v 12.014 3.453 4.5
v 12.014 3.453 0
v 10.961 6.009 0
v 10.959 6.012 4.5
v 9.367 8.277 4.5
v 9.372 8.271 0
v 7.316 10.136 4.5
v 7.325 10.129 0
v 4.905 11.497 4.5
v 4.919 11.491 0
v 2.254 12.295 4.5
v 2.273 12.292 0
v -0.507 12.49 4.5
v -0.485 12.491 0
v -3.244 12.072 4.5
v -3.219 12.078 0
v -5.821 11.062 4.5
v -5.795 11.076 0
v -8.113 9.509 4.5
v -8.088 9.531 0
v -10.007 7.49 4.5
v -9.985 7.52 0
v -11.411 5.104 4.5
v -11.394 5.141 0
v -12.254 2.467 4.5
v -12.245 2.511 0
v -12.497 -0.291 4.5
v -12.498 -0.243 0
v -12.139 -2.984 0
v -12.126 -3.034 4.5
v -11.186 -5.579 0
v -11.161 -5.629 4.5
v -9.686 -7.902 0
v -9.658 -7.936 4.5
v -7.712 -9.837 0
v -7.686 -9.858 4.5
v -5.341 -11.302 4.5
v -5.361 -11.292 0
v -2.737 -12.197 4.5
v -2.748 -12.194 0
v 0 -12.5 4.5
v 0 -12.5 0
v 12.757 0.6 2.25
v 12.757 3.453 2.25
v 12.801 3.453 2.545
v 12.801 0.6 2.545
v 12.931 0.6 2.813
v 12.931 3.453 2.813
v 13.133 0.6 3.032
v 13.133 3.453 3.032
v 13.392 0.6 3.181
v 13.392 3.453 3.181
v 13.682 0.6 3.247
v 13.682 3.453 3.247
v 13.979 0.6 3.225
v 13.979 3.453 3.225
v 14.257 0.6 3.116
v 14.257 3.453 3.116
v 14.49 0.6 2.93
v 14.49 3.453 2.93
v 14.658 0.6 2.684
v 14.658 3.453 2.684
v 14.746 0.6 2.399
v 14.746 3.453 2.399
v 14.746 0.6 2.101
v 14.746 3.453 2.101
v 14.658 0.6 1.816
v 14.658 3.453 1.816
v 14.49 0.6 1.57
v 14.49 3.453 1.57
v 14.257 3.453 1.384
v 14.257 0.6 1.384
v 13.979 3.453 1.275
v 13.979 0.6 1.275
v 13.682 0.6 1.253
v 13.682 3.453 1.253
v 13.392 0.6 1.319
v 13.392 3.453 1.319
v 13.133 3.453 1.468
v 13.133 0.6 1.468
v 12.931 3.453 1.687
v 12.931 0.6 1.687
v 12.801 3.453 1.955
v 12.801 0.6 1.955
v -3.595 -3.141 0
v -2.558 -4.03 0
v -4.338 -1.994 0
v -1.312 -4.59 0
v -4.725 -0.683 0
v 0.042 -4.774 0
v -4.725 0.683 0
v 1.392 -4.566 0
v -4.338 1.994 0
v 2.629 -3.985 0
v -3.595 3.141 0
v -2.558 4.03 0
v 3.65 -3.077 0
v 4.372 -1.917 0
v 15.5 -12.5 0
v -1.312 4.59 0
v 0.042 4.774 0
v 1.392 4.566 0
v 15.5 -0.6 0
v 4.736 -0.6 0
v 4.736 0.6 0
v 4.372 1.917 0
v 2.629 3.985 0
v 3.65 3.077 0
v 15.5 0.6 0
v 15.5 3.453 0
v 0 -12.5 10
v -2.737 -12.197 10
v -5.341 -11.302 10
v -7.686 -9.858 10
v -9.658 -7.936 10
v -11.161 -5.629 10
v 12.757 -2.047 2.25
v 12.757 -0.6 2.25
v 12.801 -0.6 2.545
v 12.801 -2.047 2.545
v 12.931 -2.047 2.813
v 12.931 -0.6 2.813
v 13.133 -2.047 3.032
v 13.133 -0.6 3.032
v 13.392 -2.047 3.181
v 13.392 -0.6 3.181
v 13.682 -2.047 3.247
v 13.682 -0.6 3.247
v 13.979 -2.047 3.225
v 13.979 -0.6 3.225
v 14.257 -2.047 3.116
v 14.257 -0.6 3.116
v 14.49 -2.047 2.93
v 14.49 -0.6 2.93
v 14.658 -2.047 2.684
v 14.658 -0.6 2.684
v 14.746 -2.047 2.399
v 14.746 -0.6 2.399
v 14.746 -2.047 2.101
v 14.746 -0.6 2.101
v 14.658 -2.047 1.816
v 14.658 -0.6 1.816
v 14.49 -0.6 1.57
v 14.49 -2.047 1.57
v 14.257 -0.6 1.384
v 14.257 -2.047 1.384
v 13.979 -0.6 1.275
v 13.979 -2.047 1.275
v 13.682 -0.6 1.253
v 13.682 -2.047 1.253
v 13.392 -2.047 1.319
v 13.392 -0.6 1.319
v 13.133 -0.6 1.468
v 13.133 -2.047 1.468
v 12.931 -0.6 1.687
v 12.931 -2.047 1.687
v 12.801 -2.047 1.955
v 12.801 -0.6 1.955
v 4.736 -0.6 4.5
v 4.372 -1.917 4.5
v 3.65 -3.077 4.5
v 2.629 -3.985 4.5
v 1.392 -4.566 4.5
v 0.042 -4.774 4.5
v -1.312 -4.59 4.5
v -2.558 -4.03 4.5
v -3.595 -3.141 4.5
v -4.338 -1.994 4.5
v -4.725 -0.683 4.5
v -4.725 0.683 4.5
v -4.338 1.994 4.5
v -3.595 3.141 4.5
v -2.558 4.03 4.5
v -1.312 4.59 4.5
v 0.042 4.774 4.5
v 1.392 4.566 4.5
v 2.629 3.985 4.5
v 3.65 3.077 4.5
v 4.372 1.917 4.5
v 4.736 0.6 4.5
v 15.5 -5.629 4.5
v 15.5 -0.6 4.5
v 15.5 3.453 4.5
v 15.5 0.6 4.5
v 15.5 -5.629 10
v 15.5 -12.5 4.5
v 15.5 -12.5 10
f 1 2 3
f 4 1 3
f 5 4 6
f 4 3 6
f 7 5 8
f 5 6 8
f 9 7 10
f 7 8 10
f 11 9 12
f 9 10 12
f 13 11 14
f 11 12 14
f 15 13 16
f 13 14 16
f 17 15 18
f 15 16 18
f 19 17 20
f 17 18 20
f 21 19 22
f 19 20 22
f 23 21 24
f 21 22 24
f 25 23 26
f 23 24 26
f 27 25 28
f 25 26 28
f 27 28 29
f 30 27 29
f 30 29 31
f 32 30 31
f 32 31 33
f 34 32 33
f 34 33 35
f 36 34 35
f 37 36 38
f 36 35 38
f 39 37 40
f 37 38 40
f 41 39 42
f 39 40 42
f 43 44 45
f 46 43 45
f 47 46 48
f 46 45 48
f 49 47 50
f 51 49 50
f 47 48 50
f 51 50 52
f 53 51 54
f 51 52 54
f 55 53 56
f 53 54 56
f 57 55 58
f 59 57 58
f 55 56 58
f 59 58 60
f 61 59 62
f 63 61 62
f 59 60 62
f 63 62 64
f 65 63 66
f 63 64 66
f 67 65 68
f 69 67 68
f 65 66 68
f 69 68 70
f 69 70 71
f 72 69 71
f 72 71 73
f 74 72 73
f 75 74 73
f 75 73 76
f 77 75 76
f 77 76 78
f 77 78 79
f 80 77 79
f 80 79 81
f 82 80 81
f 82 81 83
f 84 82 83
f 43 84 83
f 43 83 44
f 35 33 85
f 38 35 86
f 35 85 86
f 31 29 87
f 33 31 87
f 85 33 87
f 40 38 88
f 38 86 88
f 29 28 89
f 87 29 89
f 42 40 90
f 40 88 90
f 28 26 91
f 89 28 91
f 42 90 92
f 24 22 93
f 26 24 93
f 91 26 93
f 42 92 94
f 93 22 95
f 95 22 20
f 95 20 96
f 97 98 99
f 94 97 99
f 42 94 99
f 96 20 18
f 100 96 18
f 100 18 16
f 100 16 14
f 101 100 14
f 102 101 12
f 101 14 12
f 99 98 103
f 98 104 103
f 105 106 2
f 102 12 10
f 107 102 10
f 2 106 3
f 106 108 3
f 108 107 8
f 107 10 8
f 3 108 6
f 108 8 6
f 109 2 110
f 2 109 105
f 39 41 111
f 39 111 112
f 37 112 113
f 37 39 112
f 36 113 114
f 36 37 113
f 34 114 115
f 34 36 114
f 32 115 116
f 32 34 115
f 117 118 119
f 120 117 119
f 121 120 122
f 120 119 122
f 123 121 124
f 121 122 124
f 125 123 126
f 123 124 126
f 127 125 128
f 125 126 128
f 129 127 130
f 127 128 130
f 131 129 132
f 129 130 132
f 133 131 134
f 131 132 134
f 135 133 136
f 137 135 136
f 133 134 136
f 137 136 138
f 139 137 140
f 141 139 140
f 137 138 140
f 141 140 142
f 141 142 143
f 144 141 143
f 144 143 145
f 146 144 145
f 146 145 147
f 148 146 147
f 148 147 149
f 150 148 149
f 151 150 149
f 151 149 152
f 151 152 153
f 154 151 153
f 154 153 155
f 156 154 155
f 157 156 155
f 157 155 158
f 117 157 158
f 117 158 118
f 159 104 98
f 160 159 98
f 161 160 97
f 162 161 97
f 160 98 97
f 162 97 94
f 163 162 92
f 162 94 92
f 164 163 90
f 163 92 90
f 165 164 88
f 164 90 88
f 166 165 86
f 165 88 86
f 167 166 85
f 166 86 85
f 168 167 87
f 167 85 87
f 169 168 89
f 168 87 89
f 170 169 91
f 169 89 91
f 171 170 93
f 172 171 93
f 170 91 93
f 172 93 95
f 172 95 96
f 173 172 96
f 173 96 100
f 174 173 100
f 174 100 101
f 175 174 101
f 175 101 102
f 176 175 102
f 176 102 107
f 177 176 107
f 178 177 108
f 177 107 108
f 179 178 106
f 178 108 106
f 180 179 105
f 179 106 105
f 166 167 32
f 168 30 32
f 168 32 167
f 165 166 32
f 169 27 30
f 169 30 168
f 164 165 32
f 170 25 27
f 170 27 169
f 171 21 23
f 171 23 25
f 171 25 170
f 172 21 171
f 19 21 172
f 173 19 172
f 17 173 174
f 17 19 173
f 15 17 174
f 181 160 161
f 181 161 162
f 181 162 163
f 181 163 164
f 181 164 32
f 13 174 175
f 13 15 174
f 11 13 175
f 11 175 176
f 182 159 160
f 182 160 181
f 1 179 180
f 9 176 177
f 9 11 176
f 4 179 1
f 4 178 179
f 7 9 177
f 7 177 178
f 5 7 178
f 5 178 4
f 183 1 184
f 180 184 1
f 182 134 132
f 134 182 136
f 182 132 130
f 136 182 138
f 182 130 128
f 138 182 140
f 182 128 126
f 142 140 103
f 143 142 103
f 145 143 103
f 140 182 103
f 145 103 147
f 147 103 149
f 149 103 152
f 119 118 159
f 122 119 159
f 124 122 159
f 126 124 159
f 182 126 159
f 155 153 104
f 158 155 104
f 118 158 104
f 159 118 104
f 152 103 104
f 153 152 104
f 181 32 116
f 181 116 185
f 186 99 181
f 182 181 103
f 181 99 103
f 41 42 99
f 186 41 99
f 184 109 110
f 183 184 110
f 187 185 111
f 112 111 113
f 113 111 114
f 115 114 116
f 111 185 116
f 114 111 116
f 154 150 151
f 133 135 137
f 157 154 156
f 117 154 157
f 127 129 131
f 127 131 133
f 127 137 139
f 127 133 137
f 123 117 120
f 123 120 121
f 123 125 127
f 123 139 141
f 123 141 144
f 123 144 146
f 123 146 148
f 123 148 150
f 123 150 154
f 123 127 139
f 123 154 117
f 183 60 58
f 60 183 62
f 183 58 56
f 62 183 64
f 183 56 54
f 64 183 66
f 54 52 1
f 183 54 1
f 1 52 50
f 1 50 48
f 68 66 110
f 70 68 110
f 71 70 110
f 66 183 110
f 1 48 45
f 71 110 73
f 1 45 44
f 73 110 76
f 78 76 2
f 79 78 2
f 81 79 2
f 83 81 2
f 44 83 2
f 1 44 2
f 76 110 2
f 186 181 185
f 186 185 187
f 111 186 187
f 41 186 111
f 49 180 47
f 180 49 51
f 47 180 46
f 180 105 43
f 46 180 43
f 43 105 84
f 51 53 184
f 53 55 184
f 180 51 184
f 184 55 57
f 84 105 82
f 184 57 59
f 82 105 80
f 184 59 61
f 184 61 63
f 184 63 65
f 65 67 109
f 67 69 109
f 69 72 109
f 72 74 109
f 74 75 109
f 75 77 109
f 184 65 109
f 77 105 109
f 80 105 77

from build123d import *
from build123d.topology import SkipClean

# Parameters (mm, degrees)
BOSS_EXTRUDE1_DEPTH = 4.5
BOSS_EXTRUDE2_DEPTH = 5.5
SKETCH4_R           = 1
CUT_EXTRUDE1_DEPTH  = 5.5


with BuildPart() as part:
    # Sketch1 → Boss-Extrude1 (new body)
    with BuildSketch(Plane.XY):
        with BuildLine():
            Line((0, -12.5), (15.5, -12.5))
            Line((15.5, -12.5), (15.5, -0.6))
            Line((15.5, -0.6), (4.735951007, -0.6))
            ThreePointArc((4.735951007, -0.6), (-4.77380686, 0), (4.735951007, 0.6))
            Line((4.735951007, 0.6), (15.5, 0.6))
            Line((15.5, 0.6), (15.5, 3.452502188))
            Line((15.5, 3.452502188), (12.013751647, 3.452502188))
            ThreePointArc((12.013751647, 3.452502188), (-9.985145901, 7.519764712), (0, -12.5))
        make_face()
    extrude(amount=BOSS_EXTRUDE1_DEPTH)

    # Sketch2 → Boss-Extrude2 (add)
    with SkipClean():  # the faces are left unmerged after this step: merging them gives an invalid solid
        with BuildSketch(Plane.XY.offset(4.5)):
            with BuildLine():
                Line((15.5, -12.5), (0, -12.5))
                ThreePointArc((0, -12.5), (-6.553255279, -10.644474869), (-11.160953781, -5.628775239))
                Line((-11.160953781, -5.628775239), (15.5, -5.628775239))
                Line((15.5, -5.628775239), (15.5, -12.5))
            make_face()
        extrude(amount=BOSS_EXTRUDE2_DEPTH)

    # Sketch4 → Cut-Extrude1 (cut)
    with SkipClean():  # the faces are left unmerged after this step: merging them gives an invalid solid
        with BuildSketch(Plane(origin=(0, 3.452502188, 0), x_dir=(1, 0, 0), z_dir=(0, 1, 0))):
            with Locations(Location((13.756875824, -2.25, 0), (0, 0, 180))):
                Circle(SKETCH4_R)
        extrude(amount=-CUT_EXTRUDE1_DEPTH, mode=Mode.SUBTRACT)


solid = part.part
